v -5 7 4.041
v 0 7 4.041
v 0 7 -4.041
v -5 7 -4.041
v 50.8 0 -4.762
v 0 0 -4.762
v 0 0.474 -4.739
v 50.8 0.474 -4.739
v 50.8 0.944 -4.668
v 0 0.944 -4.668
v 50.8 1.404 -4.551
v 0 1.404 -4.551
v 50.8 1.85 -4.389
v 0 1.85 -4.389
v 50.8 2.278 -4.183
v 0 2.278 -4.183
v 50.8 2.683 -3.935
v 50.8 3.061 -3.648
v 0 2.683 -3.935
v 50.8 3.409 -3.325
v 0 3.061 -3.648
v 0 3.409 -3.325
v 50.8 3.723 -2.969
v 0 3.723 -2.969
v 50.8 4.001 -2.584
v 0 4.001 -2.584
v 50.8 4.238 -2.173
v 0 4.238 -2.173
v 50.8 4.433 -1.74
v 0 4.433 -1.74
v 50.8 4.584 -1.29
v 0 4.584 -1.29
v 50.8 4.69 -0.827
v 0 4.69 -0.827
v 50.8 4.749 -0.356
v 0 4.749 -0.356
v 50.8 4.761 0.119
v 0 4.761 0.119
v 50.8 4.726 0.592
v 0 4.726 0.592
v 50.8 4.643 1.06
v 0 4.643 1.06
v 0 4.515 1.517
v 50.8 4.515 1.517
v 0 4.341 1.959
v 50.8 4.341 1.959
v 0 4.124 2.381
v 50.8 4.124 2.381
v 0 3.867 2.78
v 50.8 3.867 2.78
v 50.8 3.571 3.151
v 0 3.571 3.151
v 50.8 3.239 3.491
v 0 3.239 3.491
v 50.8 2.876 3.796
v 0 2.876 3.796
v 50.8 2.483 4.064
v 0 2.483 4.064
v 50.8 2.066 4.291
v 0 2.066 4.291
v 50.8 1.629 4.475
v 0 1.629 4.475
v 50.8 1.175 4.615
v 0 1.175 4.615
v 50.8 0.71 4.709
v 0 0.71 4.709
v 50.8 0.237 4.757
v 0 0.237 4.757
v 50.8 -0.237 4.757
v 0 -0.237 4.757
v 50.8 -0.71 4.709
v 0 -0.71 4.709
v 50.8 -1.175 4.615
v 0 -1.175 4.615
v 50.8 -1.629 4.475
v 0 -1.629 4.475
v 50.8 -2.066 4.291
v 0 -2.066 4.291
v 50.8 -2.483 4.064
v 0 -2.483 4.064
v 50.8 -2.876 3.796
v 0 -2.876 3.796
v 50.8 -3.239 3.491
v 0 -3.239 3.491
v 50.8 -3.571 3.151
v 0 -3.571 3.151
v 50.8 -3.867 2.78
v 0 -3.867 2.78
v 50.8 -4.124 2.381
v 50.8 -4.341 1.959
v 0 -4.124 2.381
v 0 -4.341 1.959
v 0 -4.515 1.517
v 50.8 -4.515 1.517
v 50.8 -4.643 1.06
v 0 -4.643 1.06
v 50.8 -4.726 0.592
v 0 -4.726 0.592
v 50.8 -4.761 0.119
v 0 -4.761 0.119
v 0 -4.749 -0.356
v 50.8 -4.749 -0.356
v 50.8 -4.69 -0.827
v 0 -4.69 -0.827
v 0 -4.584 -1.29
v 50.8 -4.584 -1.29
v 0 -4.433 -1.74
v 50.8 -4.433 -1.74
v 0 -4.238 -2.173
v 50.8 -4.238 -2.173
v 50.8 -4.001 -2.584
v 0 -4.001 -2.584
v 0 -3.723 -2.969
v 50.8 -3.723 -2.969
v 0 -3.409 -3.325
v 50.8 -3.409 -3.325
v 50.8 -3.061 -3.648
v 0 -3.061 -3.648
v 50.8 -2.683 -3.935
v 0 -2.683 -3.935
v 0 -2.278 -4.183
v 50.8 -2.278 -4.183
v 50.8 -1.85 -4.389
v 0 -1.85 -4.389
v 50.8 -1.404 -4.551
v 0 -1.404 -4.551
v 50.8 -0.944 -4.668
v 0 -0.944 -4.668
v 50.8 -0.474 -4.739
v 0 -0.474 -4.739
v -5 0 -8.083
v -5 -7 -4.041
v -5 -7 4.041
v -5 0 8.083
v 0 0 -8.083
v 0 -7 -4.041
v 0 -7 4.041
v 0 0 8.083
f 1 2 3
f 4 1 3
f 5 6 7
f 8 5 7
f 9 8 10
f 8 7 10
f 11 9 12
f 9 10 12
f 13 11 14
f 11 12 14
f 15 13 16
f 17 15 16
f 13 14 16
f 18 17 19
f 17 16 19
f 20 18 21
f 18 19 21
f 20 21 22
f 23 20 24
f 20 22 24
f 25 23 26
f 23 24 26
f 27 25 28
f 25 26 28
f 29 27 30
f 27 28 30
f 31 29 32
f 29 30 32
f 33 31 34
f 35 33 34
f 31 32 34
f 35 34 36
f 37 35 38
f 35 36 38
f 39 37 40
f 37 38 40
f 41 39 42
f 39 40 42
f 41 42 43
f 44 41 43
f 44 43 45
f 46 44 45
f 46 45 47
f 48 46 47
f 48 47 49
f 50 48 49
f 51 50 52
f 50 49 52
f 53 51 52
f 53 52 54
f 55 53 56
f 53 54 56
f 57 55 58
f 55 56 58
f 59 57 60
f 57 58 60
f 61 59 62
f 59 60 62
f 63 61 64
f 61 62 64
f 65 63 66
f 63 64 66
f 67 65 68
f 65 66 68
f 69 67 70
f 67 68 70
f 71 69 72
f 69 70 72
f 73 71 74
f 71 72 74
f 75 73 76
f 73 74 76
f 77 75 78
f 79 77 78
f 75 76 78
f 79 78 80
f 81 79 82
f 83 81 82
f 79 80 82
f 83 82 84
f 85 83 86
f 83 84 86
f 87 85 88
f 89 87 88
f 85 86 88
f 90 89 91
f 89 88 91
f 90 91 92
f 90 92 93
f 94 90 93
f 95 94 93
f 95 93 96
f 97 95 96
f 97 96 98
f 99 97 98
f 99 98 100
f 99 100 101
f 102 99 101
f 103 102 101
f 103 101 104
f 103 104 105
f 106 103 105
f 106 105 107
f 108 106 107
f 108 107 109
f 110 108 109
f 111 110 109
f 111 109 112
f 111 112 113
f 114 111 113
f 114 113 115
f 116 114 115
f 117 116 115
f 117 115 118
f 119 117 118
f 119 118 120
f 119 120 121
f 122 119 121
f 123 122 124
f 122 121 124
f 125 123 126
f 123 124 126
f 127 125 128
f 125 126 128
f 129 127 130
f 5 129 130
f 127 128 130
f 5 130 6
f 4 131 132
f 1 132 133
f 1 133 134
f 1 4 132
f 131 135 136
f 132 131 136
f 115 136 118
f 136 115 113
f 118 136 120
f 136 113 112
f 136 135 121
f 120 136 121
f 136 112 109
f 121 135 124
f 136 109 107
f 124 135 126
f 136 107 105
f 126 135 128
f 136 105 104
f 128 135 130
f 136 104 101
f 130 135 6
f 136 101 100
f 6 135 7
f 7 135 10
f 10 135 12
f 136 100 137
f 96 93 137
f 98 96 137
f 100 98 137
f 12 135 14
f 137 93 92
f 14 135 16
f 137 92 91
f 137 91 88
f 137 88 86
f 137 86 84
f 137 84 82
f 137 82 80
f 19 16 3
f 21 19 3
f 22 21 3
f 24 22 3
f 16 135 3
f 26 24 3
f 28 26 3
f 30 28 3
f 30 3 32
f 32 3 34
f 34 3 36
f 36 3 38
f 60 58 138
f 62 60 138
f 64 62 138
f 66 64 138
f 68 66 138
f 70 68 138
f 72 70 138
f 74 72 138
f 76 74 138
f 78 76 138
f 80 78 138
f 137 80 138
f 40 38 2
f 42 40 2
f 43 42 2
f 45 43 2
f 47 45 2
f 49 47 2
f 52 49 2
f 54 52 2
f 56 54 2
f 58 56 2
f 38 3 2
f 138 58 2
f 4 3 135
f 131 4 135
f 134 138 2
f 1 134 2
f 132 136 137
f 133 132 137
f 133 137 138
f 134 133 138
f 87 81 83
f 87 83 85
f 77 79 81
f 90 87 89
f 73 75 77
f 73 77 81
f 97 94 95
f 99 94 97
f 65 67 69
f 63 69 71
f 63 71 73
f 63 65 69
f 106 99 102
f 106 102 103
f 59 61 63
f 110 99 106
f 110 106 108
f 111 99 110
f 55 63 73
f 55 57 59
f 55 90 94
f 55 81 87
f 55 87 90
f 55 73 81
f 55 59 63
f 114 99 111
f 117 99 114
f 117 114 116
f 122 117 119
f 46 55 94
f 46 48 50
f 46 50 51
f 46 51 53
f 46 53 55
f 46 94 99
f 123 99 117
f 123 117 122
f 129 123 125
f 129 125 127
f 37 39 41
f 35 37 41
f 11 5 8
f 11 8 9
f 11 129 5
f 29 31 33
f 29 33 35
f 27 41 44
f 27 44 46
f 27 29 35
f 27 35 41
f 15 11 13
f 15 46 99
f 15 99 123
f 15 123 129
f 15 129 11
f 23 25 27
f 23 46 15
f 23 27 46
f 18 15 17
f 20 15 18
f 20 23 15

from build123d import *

# Parameters (mm, degrees)
SKETCH1_R           = 4.7625
BOSS_EXTRUDE1_DEPTH = 50.8
BOSS_EXTRUDE2_DEPTH = 5


with BuildPart() as part:
    # Sketch1 → Boss-Extrude1 (new body)
    with BuildSketch(Plane(origin=(0, 0, 0), x_dir=(0, 0, -1), z_dir=(1, 0, 0))):
        Circle(SKETCH1_R)
    extrude(amount=BOSS_EXTRUDE1_DEPTH)

    # Sketch2 → Boss-Extrude2 (add)
    with BuildSketch(Plane.ZY):
        Polygon((8.082903769, 0), (4.041451884, 7), (-4.041451884, 7), (-8.082903769, 0), (-4.041451884, -7), (4.041451884, -7), align=None)
    extrude(amount=BOSS_EXTRUDE2_DEPTH)


solid = part.part
